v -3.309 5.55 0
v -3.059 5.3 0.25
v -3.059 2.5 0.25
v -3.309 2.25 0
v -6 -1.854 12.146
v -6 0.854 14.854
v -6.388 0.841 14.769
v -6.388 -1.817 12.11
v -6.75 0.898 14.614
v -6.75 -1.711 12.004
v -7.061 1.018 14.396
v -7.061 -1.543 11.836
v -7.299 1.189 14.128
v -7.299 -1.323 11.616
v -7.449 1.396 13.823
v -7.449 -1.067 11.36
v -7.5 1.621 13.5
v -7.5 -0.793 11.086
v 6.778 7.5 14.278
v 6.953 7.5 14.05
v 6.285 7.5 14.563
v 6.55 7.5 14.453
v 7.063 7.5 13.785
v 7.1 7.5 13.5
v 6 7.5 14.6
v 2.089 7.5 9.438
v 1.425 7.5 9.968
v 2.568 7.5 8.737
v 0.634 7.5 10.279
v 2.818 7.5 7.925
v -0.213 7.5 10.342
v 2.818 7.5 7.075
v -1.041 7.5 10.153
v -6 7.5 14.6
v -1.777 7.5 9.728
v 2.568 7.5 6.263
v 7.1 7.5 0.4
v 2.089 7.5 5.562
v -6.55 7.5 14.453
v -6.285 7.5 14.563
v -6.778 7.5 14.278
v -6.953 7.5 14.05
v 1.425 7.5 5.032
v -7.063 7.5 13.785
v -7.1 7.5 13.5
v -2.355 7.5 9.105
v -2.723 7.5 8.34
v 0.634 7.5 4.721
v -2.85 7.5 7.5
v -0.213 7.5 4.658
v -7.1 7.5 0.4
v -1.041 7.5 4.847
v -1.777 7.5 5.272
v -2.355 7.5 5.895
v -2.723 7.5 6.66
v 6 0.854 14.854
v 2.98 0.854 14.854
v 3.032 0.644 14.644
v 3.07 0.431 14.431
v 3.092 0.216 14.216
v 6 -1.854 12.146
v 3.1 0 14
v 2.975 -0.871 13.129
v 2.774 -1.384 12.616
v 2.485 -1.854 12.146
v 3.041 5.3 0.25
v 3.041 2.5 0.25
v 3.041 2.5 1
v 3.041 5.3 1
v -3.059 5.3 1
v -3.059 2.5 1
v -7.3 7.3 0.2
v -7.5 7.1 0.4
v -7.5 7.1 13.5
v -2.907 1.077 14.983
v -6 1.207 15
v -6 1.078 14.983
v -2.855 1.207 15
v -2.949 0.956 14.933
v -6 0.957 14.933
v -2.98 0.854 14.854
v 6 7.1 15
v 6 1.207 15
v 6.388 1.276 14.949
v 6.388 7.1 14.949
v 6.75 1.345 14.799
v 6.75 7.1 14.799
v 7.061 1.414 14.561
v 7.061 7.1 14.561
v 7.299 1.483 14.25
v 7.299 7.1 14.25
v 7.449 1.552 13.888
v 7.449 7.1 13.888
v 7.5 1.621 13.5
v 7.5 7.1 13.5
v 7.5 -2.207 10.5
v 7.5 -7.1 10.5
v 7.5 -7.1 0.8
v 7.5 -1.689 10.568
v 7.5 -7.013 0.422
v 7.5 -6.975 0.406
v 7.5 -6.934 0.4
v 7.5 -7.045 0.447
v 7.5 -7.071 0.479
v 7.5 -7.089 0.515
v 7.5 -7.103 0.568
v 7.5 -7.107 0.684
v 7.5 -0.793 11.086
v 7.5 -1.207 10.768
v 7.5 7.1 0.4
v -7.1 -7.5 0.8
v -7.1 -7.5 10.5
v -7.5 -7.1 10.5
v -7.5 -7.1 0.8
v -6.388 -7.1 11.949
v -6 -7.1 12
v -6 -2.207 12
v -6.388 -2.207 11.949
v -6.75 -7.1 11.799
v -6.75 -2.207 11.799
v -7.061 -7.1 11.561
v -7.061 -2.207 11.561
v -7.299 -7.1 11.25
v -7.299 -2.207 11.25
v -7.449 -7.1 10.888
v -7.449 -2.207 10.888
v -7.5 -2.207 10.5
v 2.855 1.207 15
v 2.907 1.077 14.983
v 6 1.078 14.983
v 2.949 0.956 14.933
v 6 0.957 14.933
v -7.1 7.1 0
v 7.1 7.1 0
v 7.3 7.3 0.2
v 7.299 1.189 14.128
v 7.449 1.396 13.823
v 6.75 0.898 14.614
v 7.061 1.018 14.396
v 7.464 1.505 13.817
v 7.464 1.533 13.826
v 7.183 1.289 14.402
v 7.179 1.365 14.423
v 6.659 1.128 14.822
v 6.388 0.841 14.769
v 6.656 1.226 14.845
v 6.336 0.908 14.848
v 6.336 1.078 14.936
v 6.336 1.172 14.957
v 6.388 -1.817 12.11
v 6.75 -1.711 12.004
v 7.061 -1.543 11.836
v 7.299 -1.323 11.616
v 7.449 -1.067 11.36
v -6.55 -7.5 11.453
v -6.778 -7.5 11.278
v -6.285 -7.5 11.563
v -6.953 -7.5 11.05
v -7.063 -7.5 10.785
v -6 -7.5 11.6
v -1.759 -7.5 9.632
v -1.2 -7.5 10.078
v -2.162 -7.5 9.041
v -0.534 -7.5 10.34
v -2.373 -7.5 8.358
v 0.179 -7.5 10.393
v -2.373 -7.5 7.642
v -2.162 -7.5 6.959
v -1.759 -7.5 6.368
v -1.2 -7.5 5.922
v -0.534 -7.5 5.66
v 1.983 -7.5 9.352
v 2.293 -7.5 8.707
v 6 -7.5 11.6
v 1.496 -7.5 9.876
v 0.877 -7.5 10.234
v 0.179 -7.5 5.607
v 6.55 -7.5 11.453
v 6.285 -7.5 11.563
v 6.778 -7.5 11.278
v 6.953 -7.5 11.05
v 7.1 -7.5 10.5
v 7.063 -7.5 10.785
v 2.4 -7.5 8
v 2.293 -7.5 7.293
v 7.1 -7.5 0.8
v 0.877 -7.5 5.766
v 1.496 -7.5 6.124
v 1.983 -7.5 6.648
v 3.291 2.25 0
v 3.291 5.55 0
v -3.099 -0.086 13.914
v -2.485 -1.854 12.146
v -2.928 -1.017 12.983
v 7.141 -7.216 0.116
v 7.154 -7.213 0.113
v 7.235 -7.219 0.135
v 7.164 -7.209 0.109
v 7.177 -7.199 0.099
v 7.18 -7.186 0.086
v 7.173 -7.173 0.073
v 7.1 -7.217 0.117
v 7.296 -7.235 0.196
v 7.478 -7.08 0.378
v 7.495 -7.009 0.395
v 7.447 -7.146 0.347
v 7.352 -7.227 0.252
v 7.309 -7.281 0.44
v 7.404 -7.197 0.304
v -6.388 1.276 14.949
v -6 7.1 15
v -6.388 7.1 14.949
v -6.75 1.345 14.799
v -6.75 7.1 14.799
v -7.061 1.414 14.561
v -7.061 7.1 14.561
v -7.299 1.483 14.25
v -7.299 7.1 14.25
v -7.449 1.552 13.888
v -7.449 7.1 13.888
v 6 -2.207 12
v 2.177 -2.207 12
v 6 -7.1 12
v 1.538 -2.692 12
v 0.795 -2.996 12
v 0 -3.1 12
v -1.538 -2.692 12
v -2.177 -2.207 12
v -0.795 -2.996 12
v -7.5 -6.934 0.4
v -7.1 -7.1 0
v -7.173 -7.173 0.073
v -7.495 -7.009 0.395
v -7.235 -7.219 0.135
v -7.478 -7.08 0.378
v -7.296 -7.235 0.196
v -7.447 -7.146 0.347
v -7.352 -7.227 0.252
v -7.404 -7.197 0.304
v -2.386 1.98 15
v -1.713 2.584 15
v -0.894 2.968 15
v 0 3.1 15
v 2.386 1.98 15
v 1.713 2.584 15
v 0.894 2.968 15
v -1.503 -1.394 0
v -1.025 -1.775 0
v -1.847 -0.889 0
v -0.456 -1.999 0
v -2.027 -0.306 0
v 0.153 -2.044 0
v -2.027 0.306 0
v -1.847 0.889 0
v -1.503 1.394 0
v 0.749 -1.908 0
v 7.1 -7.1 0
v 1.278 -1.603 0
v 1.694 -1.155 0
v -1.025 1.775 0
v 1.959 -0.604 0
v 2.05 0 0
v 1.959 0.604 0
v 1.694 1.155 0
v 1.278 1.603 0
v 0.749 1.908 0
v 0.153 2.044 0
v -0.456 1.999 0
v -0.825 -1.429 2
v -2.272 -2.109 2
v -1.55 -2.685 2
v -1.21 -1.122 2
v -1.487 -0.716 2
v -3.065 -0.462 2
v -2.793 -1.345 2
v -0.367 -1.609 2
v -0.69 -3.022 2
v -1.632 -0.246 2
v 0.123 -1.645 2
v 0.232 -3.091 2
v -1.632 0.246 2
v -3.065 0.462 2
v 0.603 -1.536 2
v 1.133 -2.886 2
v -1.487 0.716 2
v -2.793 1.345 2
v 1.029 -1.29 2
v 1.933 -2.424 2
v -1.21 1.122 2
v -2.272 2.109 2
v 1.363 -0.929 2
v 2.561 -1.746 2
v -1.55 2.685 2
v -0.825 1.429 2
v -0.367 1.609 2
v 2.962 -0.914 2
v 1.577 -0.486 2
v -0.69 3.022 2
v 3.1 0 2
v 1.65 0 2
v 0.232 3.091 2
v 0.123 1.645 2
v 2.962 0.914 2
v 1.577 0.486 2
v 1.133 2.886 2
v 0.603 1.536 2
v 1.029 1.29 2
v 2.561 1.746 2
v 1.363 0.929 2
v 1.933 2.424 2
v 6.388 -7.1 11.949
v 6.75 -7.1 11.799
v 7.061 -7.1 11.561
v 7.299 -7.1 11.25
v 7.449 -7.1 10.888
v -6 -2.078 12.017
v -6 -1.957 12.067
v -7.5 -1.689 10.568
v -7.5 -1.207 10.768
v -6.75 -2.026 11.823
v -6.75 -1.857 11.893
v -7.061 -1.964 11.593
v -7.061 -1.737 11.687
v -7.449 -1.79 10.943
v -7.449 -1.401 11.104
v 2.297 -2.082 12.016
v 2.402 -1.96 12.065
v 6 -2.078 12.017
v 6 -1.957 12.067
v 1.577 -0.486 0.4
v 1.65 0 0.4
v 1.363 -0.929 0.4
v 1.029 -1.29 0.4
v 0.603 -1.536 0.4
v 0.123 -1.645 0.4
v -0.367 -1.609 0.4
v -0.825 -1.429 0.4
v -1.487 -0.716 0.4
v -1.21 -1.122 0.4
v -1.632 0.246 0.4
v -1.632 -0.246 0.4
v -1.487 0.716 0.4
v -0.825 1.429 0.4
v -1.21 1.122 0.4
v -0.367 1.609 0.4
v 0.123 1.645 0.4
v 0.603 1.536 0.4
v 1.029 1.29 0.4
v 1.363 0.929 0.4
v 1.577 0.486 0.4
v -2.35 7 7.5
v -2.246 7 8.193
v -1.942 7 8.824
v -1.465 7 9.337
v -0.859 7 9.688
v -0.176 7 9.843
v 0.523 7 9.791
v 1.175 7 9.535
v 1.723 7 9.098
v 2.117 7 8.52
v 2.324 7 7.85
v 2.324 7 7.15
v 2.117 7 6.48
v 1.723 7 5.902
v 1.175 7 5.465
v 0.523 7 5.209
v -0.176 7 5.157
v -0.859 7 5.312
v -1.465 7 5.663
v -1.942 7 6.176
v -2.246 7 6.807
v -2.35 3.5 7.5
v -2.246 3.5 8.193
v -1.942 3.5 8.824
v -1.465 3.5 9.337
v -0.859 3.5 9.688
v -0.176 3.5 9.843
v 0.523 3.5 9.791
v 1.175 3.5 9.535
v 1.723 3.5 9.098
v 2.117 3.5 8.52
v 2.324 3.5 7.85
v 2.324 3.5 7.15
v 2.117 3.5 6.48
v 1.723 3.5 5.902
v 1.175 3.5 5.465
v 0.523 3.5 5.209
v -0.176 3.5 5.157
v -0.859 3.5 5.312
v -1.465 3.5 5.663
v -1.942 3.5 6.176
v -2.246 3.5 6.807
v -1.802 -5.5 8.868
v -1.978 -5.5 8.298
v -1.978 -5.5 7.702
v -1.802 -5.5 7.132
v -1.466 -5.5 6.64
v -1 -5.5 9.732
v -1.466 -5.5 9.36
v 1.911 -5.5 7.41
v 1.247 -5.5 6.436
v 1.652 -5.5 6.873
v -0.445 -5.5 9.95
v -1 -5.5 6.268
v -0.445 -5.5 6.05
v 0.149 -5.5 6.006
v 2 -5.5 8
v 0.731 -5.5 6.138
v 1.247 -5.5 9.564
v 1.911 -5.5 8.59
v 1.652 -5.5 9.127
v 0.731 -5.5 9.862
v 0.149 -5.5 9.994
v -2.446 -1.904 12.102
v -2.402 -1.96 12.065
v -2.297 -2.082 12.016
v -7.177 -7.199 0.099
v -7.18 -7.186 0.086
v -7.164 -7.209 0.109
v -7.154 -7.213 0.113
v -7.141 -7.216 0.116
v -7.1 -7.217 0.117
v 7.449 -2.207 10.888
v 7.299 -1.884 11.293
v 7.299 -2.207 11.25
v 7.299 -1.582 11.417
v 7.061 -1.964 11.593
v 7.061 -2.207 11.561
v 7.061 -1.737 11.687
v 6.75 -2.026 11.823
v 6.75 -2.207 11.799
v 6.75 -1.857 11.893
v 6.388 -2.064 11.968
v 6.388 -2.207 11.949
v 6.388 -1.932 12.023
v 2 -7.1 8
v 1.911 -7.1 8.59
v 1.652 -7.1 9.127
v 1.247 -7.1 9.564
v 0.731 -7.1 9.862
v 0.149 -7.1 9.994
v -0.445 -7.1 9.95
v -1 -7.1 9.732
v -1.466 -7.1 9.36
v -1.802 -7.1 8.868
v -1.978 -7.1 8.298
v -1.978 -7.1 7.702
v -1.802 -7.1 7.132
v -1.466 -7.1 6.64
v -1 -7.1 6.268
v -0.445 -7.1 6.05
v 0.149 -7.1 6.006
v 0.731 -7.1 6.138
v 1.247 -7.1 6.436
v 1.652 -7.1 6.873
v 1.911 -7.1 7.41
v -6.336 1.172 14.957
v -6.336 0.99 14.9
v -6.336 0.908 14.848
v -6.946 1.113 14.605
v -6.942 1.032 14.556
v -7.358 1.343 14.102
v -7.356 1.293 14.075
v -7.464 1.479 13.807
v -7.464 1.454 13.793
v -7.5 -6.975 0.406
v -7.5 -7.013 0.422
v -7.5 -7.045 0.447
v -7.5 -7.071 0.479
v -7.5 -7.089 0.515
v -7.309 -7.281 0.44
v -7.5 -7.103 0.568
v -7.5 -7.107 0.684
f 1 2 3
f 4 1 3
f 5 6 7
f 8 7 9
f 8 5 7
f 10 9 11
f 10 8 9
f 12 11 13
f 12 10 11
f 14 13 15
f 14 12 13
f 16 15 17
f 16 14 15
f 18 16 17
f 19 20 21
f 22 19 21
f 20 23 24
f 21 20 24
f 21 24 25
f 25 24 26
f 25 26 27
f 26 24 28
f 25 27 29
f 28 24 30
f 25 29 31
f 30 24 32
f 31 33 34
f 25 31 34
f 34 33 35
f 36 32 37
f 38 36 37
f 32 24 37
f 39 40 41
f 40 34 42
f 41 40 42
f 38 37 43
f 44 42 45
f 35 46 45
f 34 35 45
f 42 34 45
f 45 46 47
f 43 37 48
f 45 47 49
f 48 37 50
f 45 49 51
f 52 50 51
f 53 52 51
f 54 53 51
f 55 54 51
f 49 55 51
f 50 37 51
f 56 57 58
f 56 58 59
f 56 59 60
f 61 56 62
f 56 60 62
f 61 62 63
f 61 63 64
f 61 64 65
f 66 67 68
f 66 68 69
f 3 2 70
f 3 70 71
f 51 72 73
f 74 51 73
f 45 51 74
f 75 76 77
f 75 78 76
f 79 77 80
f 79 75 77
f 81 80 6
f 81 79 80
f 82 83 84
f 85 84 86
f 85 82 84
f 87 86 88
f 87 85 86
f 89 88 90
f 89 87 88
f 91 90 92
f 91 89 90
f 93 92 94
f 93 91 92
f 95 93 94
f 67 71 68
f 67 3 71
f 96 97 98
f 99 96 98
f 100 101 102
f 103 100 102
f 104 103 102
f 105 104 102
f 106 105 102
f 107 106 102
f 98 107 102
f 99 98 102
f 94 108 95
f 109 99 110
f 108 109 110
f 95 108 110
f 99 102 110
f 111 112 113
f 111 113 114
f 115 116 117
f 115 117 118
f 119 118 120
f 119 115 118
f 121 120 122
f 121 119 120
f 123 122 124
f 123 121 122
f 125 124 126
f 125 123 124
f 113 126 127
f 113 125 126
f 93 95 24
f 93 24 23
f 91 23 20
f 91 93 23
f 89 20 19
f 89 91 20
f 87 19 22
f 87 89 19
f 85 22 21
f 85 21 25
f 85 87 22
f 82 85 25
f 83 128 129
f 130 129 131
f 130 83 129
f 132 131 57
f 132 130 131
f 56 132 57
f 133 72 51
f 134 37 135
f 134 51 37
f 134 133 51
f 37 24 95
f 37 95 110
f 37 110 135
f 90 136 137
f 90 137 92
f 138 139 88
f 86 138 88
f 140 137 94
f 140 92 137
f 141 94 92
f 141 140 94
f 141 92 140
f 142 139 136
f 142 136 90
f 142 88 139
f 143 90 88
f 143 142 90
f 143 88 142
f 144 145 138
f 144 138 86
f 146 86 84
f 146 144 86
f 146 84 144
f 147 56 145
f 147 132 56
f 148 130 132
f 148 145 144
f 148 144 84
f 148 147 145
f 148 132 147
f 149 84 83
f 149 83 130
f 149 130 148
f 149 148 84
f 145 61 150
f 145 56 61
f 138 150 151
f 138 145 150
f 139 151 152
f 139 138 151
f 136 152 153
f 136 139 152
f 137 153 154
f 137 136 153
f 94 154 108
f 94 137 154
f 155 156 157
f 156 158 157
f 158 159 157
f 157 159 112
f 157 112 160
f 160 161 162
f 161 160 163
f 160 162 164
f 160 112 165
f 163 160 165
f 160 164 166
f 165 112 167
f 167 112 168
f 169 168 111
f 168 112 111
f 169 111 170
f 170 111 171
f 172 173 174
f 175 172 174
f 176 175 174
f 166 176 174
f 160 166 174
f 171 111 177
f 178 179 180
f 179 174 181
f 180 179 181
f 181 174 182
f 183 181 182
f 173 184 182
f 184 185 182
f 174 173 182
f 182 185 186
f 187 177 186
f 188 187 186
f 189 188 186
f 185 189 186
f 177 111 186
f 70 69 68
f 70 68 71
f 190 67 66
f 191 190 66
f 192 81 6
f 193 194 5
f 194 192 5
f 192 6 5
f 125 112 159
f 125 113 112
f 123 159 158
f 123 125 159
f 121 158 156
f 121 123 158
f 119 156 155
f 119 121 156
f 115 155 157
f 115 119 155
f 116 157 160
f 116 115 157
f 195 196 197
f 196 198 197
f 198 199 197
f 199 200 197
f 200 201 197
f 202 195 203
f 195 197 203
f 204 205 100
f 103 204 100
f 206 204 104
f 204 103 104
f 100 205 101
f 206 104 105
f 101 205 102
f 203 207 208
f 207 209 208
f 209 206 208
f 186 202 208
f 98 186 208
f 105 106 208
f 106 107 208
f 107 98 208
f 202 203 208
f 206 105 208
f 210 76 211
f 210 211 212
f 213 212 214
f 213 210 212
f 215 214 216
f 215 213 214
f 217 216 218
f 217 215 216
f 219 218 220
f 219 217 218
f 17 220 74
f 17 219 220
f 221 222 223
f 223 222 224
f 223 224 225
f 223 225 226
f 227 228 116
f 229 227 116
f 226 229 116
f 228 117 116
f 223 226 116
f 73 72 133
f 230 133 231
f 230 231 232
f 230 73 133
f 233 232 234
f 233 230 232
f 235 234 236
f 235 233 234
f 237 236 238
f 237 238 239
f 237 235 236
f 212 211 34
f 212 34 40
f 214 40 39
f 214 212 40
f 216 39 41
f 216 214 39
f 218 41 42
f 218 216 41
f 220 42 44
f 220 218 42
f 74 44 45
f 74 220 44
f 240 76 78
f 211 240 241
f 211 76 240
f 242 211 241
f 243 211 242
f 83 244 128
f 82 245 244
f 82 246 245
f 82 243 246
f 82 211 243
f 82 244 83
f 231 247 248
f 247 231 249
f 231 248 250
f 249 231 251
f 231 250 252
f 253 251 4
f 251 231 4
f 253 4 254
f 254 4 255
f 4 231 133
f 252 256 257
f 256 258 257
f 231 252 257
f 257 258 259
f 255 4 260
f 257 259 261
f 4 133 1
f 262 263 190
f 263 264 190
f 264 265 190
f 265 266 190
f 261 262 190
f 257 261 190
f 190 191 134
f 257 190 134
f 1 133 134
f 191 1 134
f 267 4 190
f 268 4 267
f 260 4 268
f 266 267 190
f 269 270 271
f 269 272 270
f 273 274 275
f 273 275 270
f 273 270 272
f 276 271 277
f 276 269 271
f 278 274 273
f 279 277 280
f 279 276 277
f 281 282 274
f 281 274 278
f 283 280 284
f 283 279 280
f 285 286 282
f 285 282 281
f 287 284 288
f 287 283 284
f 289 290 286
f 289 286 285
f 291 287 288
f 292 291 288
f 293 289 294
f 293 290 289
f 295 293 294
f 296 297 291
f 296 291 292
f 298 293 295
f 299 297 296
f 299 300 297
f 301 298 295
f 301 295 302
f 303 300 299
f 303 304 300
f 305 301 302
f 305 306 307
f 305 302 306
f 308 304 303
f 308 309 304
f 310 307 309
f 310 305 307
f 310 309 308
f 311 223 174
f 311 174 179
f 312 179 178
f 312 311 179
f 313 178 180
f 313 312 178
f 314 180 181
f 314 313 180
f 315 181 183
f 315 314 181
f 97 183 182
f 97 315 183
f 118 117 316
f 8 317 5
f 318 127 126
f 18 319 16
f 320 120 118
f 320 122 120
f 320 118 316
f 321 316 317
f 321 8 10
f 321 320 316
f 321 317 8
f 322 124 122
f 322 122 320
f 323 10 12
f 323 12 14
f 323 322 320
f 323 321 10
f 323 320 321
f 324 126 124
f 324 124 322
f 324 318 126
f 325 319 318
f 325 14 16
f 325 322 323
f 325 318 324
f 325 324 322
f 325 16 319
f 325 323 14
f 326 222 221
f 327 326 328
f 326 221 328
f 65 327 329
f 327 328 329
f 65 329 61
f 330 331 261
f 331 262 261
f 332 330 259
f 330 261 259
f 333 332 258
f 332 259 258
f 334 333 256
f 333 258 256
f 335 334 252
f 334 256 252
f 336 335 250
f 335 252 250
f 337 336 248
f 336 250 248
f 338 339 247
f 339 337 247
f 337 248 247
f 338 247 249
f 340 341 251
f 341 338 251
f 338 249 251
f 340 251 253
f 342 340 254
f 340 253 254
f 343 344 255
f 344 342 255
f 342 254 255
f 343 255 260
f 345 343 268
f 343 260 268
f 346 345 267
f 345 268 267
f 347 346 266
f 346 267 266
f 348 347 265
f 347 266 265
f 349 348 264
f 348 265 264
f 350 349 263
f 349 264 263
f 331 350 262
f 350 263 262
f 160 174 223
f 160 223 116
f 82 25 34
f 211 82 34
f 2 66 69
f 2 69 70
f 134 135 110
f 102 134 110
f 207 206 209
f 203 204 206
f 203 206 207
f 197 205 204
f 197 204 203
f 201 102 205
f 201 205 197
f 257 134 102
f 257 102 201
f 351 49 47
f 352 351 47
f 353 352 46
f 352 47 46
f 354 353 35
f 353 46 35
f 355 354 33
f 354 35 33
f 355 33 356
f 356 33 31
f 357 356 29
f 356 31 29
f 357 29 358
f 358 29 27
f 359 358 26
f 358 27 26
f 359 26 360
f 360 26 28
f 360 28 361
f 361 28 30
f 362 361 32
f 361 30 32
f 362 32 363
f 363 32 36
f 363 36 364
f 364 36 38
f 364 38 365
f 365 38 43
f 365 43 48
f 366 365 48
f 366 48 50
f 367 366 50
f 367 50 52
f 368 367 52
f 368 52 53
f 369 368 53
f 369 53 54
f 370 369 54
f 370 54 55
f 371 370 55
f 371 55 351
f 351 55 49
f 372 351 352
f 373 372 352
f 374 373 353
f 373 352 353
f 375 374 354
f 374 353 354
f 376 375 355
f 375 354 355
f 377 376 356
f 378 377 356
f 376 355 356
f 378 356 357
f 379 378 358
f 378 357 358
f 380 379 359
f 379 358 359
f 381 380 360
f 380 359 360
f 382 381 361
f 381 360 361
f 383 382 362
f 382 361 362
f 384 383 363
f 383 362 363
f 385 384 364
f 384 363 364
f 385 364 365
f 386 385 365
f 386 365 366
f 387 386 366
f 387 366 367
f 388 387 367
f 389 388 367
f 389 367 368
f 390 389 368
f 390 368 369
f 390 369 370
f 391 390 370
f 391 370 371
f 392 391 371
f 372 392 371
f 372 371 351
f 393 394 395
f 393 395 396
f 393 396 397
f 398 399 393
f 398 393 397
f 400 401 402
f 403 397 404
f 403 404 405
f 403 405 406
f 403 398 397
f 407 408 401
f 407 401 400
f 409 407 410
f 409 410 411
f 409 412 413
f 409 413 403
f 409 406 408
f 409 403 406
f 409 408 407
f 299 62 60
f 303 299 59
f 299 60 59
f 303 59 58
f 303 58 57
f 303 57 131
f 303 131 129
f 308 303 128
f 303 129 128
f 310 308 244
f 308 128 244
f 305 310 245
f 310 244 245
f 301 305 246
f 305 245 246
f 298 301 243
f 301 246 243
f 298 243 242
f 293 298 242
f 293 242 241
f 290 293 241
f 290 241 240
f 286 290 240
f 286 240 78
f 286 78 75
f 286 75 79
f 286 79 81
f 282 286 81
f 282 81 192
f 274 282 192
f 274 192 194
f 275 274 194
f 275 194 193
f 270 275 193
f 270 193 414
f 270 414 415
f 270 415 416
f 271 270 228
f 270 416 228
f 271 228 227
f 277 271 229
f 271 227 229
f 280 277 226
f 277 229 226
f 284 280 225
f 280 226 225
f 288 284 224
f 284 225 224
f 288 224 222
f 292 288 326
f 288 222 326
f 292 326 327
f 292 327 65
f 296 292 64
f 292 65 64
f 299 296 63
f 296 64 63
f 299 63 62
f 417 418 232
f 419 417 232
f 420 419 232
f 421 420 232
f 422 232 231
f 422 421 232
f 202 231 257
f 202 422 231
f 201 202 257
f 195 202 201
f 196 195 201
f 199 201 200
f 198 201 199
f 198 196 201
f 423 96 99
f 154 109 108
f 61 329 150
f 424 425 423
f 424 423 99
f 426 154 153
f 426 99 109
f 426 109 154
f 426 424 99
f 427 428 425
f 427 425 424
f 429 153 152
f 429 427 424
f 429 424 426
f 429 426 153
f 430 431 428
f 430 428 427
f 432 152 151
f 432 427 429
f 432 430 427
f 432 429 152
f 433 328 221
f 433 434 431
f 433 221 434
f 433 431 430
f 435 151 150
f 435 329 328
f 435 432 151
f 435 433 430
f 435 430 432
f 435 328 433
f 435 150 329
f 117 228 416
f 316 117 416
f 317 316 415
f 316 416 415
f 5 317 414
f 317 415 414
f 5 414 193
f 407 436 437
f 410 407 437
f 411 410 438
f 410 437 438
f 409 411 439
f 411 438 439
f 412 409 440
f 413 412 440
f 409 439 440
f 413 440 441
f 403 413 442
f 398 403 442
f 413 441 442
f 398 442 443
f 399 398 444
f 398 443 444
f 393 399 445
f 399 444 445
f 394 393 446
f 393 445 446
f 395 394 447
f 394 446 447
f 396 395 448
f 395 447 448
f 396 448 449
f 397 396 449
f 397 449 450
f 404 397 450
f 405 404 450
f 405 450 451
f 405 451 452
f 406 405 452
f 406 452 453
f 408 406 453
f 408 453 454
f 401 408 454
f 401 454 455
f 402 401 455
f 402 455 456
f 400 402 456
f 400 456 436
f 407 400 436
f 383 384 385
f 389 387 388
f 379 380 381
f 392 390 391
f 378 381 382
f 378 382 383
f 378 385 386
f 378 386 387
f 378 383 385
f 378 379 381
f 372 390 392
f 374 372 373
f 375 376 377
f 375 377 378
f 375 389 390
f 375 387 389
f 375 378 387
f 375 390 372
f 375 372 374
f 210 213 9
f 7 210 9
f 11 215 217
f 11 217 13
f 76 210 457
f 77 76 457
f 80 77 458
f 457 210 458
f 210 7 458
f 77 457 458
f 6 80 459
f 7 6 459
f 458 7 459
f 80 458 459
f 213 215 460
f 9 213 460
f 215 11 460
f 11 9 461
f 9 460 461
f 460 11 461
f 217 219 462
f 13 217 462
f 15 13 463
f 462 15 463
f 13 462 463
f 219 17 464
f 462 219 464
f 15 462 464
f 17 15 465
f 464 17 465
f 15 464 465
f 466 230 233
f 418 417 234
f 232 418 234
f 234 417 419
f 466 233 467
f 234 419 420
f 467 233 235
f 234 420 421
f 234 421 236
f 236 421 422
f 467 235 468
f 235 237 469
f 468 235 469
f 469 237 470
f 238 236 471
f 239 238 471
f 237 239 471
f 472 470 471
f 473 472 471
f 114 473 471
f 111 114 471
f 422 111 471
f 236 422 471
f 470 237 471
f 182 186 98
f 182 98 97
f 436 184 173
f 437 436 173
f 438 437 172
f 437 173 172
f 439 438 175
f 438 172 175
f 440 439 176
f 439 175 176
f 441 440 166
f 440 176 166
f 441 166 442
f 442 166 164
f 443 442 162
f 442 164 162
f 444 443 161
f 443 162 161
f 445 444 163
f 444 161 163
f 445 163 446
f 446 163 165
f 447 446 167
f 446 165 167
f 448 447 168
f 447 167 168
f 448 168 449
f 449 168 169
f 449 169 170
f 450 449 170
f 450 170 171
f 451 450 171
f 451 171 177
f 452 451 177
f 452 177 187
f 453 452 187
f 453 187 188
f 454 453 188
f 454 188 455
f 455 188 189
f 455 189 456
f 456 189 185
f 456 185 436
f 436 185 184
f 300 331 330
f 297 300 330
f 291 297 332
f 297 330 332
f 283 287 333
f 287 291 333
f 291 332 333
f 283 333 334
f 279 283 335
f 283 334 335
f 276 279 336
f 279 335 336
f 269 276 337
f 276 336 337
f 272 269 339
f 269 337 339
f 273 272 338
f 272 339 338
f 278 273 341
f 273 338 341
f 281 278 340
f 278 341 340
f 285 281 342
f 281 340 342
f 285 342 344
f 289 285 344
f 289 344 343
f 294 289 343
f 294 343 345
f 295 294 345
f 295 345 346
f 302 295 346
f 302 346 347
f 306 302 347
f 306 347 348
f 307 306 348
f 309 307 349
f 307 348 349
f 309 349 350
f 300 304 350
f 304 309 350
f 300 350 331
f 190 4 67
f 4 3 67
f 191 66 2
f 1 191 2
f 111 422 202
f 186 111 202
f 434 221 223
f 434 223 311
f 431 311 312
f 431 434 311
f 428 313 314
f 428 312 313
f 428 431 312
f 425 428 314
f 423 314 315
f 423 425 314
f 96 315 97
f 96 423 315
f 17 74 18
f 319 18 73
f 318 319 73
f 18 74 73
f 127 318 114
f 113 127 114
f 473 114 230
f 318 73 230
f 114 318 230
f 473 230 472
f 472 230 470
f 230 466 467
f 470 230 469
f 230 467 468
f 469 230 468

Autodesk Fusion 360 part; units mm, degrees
sketch "Sketch1" plane through (0, 0, 0) normal (0, 0, 1) x (1, 0, 0)
  line L0 (7.5, 7.5) -> (-7.5, 7.5)
  line L1 (-7.5, 7.5) -> (-7.5, -7.5)
  line L2 (-7.5, -7.5) -> (7.5, -7.5)
  line L3 (7.5, -7.5) -> (7.5, 7.5)
  line L4 (7.5, 7.5) -> (-7.5, -7.5) construction
  line L5 (-7.5, 7.5) -> (7.5, -7.5) construction
  circle A0 centre (0, 0) radius 1.65
  circle A1 centre (0, 0) radius 3.1
  dimension "d1" = 15
  dimension "d2" = 15
  dimension "d3" = 3.3
  dimension "d9" = 6.2
extrude "Extrude1" add sketch "Sketch1" along normal blind 15 contours L0 L1 L2 L3 | A1
sketch "Sketch2" plane through (0, 7.5, 0) normal (0, 1, 0) x (-1, 0, 0)
  line L0 (-7.5, 0) -> (7.5, 0)
  line L1 (7.5, 0) -> (7.5, 15)
  line L2 (7.5, 15) -> (-7.5, 15)
  line L3 (-7.5, 15) -> (-7.5, 0)
  circle A0 centre (0, 7.5) radius 2.35
  dimension "d6" = 4.7
extrude "Extrude2" cut sketch "Sketch2" against normal blind 4 contours A0
sketch "Sketch3" plane through (0, 0, 15) normal (0, 0, 1) x (1, 0, 0)
  circle A0 centre (0, 0) radius 1.65
  line L0 (7.5, -7.5) -> (7.5, 7.5)
  line L1 (7.5, 7.5) -> (-7.5, 7.5)
  line L2 (-7.5, 7.5) -> (-7.5, -7.5)
  line L3 (-7.5, -7.5) -> (7.5, -7.5)
  circle A1 centre (0, 0) radius 3.1
extrude "Extrude3" cut sketch "Sketch3" against normal blind 13 contours A1
sketch "Sketch4" plane through (-7.5, 0, 0) normal (-1, 0, 0) x (0, 0, 1)
  line L0 (0, 7.5) -> (0, -7.5)
  line L1 (0, -7.5) -> (15, -7.5)
  line L2 (15, -7.5) -> (15, 7.5)
  line L3 (15, 7.5) -> (0, 7.5)
  line L4 (15, 1) -> (12, -2)
  line L5 (0, -7.5) -> (12, -7.5)
  line L6 (15, 1) -> (15, 7.5)
  line L7 (5.15, 3.5) -> (9.85, 3.5)
  line L8 (5.15, 7.5) -> (9.85, 7.5)
  line L9 (12, -4) -> (0, -4)
  line L10 (12, -2) -> (12, -4)
  line L11 (12, -4) -> (12, -7.5)
  dimension "d12" = 12
  dimension "d20" = 3
  dimension "d21" = 3.5
  dimension "d22" = 135
  dimension "d23" = 5.5
extrude "Extrude4" cut sketch "Sketch4" against normal blind 186 contours L1 L2 L4 L10 L11
fillet "Fillet1" radius 0.5 4 edges at (-5.2171, 1, 15) (5.2171, 1, 15) (4.9343, -2, 12) (-4.9343, -2, 12)
fillet "Fillet2" radius 1.5 10 edges at (7.5, 4.3536, 15) (7.5, 1.0158, 14.9619) (7.5, -0.5, 13.5) (7.5, -2.0158, 12.0381) (7.5, -4.8536, 12) (-7.5, 4.3536, 15) (-7.5, 1.0158, 14.9619) (-7.5, -0.5, 13.5) (-7.5, -2.0158, 12.0381) (-7.5, -4.8536, 12)
chamfer "Chamfer2" distance 0.5 angle 45 1 edges at (2.191, 7.5, 8.3498)
chamfer "Chamfer1" distance 0.4 angle 45 1 faces at (0.0411, -5.5485, 0)
chamfer "Chamfer3" distance 0.4 angle 45 1 faces at (2, -7.5, 4.2667)
sketch "Sketch5" plane through (0, -7.5, 0) normal (0, -1, 0) x (1, 0, 0)
  line L0 (7.1, 0.8) -> (7.1, 10.5)
  line L1 (-7.1, 10.5) -> (-7.1, 0.8)
  line L2 (-7.1, 0.8) -> (7.1, 0.8)
  circle A0 centre (0, 8) radius 2
  line L3 (-7.1, 0) -> (7.1, 0)
  arc A1 (7.1, 10.5) -> (6, 11.6) centre (6, 10.5) ccw
  line L4 (6, 11.6) -> (-6, 11.6)
  arc A2 (-6, 11.6) -> (-7.1, 10.5) centre (-6, 10.5) ccw
  line L5 (6, 12) -> (-6, 12)
  dimension "d28" = 8
  dimension "d29" = 4
  dimension "d34" = 4
extrude "Extrude5" cut sketch "Sketch5" against normal blind 2 contours A0
chamfer "Chamfer4" distance 0.4 angle 45 6 edges at (-1.8647, -7.5, 8.7232) (7.5, 7.5, 6.95) (7.0607, 7.5, 14.5607) (0, 7.5, 15) (-7.0607, 7.5, 14.5607) (-7.5, 7.5, 6.95)
sketch "Sketch6" plane through (0, 0, 0) normal (0, 0, -1) x (-1, 0, 0)
  circle A0 centre (0, 0) radius 2.05
  line L0 (-7.1, 7.1) -> (-7.1, -7.1)
  line L1 (-7.1, -7.1) -> (7.1, -7.1)
  line L2 (7.1, -7.1) -> (7.1, 7.1)
  line L3 (7.1, 7.1) -> (-7.1, 7.1)
  line L4 (-3.041, 5.3) -> (3.059, 5.3)
  line L5 (3.059, 5.3) -> (3.059, 2.5)
  line L6 (3.059, 2.5) -> (-3.041, 2.5)
  line L7 (-3.041, 2.5) -> (-3.041, 5.3)
  line L8 (-7.5, 7.1) -> (-7.5, -7.1)
  line L9 (7.1, 7.5) -> (-7.1, 7.5)
  dimension "d35" = 6.1
  dimension "d36" = 2.8
  dimension "d37" = 4.459
  dimension "d38" = 2.2
extrude "Extrude6" cut sketch "Sketch6" against normal blind 1 contours L4 L5 L6 L7
chamfer "Chamfer5" distance 0.25 angle 45 4 edges at (-3.059, 3.9, 0) (-0.009, 5.3, 0) (-0.009, 2.5, 0) (3.041, 3.9, 0)
equation "d10 = -15 mm + 2 mm"
